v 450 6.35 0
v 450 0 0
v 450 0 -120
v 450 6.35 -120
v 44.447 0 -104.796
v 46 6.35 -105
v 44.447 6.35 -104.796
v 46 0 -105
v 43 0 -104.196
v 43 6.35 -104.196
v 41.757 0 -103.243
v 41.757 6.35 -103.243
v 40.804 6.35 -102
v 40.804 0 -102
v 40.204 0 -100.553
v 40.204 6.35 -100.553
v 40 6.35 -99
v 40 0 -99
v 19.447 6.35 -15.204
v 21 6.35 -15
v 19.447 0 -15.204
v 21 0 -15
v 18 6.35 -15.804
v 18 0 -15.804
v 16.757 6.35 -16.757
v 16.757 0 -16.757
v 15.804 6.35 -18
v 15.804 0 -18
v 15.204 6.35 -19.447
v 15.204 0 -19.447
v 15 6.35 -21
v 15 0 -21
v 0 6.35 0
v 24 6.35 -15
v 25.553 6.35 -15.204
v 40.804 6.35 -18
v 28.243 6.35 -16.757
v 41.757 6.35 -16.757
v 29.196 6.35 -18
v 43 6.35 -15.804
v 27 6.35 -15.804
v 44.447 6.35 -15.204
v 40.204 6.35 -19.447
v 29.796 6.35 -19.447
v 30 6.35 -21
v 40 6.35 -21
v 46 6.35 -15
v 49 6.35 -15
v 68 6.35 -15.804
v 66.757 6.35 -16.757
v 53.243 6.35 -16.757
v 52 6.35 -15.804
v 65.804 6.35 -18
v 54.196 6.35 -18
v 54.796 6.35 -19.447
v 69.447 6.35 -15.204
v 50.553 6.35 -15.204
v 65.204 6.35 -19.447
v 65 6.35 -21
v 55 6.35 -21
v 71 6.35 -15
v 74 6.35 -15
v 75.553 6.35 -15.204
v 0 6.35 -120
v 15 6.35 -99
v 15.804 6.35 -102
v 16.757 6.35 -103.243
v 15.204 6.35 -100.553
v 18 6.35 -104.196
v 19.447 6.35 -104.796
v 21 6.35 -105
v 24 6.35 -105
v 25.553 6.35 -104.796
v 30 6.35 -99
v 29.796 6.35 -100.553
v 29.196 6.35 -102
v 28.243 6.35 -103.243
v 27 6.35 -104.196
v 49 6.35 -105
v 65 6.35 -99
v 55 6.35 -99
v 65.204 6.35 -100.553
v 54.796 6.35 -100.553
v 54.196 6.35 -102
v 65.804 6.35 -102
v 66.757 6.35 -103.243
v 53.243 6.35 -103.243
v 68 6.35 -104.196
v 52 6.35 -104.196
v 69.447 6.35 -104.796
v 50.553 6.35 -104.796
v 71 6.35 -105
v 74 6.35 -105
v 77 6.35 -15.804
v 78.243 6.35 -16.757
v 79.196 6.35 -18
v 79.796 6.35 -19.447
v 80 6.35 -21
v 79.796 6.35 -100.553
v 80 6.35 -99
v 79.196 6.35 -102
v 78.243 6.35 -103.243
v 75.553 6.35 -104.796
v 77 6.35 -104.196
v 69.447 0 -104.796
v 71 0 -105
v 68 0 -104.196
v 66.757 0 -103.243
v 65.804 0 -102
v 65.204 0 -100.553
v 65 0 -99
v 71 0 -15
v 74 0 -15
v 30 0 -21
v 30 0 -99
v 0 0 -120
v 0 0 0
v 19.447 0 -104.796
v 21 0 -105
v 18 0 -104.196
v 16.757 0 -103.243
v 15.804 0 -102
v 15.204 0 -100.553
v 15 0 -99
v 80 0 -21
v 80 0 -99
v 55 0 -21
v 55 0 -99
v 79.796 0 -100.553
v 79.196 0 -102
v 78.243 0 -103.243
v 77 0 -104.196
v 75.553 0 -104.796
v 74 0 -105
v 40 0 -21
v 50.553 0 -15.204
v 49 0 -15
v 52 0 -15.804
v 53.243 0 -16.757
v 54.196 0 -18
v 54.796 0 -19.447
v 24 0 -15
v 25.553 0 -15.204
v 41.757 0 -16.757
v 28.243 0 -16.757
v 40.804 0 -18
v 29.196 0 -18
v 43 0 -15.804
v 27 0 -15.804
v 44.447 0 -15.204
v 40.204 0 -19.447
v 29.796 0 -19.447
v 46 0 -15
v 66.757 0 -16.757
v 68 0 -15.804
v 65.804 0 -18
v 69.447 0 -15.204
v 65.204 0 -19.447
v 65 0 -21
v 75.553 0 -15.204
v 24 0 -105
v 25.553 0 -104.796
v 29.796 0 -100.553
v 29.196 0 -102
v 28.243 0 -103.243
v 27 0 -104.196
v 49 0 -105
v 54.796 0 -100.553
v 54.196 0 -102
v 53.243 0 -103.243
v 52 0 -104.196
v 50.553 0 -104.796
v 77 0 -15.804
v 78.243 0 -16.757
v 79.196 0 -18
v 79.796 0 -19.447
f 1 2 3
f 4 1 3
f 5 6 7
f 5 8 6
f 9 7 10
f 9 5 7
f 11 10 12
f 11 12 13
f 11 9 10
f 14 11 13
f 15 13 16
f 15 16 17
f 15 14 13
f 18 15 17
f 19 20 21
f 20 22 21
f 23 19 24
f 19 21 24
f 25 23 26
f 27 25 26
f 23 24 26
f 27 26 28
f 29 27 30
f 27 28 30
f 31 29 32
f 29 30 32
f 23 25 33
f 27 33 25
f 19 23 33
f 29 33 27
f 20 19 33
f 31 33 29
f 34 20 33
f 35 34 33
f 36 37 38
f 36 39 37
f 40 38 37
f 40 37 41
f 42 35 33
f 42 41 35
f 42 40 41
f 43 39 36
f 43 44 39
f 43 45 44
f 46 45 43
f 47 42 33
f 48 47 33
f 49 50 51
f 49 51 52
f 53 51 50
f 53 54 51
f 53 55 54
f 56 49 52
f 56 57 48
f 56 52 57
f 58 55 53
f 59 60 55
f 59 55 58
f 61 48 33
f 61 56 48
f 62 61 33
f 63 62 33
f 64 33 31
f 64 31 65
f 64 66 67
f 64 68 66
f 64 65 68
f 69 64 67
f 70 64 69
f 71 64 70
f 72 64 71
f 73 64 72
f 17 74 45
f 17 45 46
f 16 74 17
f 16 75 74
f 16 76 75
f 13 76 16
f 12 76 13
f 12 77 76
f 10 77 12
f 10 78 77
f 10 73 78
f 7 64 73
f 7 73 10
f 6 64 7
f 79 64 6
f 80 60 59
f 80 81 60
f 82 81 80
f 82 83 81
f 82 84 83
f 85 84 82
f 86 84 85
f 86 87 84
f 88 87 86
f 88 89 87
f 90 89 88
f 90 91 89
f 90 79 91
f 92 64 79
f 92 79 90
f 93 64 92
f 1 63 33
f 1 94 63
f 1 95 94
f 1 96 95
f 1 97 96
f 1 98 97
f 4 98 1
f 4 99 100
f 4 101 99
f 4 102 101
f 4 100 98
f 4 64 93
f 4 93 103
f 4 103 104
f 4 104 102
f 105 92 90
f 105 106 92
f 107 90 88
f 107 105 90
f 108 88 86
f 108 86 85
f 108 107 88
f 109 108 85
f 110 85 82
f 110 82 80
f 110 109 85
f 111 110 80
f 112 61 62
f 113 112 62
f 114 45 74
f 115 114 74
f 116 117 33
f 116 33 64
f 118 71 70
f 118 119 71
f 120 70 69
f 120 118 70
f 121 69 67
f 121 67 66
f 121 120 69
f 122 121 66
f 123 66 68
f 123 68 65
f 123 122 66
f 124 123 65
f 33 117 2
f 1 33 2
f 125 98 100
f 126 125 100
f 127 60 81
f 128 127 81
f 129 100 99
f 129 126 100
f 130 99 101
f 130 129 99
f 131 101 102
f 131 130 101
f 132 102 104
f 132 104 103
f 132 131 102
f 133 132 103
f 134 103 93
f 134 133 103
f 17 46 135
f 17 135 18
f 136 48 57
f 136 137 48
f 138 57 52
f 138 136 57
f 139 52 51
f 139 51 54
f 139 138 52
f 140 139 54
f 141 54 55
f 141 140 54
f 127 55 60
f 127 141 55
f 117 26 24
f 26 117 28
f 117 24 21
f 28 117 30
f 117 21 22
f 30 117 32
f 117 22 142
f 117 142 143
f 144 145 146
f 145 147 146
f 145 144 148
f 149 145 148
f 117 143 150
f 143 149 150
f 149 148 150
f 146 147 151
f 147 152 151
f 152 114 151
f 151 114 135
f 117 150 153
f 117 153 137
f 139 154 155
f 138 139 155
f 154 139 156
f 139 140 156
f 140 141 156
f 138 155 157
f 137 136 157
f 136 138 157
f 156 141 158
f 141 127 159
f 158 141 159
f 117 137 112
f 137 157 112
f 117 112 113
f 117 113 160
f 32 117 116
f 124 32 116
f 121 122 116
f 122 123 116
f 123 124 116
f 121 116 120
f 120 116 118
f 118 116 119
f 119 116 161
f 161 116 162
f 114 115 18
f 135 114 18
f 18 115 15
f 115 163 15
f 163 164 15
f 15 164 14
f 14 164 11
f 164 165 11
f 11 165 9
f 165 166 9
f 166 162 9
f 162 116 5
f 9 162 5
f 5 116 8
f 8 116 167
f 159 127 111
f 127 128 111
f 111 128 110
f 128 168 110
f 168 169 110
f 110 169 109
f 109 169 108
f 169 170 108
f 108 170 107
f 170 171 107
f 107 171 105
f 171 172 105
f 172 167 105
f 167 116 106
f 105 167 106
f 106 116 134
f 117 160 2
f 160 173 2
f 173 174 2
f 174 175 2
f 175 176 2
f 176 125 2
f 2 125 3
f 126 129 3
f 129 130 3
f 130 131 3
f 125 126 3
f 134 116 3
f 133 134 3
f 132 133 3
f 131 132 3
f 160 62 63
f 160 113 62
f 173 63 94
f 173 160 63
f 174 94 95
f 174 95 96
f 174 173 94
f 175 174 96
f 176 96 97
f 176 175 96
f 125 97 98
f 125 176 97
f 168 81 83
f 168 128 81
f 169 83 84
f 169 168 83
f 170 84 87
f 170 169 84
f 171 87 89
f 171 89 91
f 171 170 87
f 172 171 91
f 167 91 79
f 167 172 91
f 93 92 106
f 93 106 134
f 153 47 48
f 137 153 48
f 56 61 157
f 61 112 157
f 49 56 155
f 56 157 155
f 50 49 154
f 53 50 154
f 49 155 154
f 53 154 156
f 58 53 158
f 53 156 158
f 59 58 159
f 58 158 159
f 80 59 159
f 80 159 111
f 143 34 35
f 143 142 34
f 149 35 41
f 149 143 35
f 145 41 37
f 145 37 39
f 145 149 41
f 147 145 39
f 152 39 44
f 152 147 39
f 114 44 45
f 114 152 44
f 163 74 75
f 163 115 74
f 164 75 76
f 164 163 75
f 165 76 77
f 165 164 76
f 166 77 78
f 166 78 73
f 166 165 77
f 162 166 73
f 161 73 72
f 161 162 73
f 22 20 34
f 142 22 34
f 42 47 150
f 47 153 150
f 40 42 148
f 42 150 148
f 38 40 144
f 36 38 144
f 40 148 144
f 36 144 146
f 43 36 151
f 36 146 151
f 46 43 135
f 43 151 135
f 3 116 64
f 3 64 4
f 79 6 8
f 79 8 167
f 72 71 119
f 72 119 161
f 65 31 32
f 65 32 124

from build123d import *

# Parameters (mm, degrees)
SKETCH1_W               = 450
SKETCH1_H               = 120
BOSS_EXTRUDE1_DEPTH     = 6.35
SKETCH2_W               = 15
SKETCH2_H               = 90
CUT_EXTRUDE1_DEPTH      = 1
CUT_EXTRUDE1_DEPTH_BACK = 7.35
FILLET1_R               = 6


with BuildPart() as part:
    # Sketch1 → Boss-Extrude1 (new body)
    with BuildSketch(Plane(origin=(0, 0, 0), x_dir=(1, 0, 0), z_dir=(0, 1, 0))):
        with Locations((225, 60)):
            Rectangle(SKETCH1_W, SKETCH1_H)
    extrude(amount=BOSS_EXTRUDE1_DEPTH)

    # Sketch2 → Cut-Extrude1 (cut, two sides)
    with BuildSketch(Plane(origin=(0, 6.35, 0), x_dir=(1, 0, 0), z_dir=(0, 1, 0))) as cut_extrude1_sk:
        with Locations((22.5, 60)):
            Rectangle(SKETCH2_W, SKETCH2_H)
        with Locations((47.5, 60)):
            Rectangle(SKETCH2_W, SKETCH2_H)
        with Locations((72.5, 60)):
            Rectangle(SKETCH2_W, SKETCH2_H)
    extrude(amount=CUT_EXTRUDE1_DEPTH, mode=Mode.SUBTRACT)
    extrude(cut_extrude1_sk.sketch, amount=-CUT_EXTRUDE1_DEPTH_BACK, mode=Mode.SUBTRACT)

    # Fillet1
    fillet1_edges = [part.edges().sort_by_distance(p)[0] for p in [
        (15, 3.175, -105),
        (30, 3.175, -105),
        (30, 3.175, -15),
        (15, 3.175, -15),
        (65, 3.175, -105),
        (80, 3.175, -105),
        (80, 3.175, -15),
        (65, 3.175, -15),
        (40, 3.175, -15),
        (40, 3.175, -105),
        (55, 3.175, -105),
        (55, 3.175, -15),
    ]]
    fillet(fillet1_edges, radius=FILLET1_R)


solid = part.part
